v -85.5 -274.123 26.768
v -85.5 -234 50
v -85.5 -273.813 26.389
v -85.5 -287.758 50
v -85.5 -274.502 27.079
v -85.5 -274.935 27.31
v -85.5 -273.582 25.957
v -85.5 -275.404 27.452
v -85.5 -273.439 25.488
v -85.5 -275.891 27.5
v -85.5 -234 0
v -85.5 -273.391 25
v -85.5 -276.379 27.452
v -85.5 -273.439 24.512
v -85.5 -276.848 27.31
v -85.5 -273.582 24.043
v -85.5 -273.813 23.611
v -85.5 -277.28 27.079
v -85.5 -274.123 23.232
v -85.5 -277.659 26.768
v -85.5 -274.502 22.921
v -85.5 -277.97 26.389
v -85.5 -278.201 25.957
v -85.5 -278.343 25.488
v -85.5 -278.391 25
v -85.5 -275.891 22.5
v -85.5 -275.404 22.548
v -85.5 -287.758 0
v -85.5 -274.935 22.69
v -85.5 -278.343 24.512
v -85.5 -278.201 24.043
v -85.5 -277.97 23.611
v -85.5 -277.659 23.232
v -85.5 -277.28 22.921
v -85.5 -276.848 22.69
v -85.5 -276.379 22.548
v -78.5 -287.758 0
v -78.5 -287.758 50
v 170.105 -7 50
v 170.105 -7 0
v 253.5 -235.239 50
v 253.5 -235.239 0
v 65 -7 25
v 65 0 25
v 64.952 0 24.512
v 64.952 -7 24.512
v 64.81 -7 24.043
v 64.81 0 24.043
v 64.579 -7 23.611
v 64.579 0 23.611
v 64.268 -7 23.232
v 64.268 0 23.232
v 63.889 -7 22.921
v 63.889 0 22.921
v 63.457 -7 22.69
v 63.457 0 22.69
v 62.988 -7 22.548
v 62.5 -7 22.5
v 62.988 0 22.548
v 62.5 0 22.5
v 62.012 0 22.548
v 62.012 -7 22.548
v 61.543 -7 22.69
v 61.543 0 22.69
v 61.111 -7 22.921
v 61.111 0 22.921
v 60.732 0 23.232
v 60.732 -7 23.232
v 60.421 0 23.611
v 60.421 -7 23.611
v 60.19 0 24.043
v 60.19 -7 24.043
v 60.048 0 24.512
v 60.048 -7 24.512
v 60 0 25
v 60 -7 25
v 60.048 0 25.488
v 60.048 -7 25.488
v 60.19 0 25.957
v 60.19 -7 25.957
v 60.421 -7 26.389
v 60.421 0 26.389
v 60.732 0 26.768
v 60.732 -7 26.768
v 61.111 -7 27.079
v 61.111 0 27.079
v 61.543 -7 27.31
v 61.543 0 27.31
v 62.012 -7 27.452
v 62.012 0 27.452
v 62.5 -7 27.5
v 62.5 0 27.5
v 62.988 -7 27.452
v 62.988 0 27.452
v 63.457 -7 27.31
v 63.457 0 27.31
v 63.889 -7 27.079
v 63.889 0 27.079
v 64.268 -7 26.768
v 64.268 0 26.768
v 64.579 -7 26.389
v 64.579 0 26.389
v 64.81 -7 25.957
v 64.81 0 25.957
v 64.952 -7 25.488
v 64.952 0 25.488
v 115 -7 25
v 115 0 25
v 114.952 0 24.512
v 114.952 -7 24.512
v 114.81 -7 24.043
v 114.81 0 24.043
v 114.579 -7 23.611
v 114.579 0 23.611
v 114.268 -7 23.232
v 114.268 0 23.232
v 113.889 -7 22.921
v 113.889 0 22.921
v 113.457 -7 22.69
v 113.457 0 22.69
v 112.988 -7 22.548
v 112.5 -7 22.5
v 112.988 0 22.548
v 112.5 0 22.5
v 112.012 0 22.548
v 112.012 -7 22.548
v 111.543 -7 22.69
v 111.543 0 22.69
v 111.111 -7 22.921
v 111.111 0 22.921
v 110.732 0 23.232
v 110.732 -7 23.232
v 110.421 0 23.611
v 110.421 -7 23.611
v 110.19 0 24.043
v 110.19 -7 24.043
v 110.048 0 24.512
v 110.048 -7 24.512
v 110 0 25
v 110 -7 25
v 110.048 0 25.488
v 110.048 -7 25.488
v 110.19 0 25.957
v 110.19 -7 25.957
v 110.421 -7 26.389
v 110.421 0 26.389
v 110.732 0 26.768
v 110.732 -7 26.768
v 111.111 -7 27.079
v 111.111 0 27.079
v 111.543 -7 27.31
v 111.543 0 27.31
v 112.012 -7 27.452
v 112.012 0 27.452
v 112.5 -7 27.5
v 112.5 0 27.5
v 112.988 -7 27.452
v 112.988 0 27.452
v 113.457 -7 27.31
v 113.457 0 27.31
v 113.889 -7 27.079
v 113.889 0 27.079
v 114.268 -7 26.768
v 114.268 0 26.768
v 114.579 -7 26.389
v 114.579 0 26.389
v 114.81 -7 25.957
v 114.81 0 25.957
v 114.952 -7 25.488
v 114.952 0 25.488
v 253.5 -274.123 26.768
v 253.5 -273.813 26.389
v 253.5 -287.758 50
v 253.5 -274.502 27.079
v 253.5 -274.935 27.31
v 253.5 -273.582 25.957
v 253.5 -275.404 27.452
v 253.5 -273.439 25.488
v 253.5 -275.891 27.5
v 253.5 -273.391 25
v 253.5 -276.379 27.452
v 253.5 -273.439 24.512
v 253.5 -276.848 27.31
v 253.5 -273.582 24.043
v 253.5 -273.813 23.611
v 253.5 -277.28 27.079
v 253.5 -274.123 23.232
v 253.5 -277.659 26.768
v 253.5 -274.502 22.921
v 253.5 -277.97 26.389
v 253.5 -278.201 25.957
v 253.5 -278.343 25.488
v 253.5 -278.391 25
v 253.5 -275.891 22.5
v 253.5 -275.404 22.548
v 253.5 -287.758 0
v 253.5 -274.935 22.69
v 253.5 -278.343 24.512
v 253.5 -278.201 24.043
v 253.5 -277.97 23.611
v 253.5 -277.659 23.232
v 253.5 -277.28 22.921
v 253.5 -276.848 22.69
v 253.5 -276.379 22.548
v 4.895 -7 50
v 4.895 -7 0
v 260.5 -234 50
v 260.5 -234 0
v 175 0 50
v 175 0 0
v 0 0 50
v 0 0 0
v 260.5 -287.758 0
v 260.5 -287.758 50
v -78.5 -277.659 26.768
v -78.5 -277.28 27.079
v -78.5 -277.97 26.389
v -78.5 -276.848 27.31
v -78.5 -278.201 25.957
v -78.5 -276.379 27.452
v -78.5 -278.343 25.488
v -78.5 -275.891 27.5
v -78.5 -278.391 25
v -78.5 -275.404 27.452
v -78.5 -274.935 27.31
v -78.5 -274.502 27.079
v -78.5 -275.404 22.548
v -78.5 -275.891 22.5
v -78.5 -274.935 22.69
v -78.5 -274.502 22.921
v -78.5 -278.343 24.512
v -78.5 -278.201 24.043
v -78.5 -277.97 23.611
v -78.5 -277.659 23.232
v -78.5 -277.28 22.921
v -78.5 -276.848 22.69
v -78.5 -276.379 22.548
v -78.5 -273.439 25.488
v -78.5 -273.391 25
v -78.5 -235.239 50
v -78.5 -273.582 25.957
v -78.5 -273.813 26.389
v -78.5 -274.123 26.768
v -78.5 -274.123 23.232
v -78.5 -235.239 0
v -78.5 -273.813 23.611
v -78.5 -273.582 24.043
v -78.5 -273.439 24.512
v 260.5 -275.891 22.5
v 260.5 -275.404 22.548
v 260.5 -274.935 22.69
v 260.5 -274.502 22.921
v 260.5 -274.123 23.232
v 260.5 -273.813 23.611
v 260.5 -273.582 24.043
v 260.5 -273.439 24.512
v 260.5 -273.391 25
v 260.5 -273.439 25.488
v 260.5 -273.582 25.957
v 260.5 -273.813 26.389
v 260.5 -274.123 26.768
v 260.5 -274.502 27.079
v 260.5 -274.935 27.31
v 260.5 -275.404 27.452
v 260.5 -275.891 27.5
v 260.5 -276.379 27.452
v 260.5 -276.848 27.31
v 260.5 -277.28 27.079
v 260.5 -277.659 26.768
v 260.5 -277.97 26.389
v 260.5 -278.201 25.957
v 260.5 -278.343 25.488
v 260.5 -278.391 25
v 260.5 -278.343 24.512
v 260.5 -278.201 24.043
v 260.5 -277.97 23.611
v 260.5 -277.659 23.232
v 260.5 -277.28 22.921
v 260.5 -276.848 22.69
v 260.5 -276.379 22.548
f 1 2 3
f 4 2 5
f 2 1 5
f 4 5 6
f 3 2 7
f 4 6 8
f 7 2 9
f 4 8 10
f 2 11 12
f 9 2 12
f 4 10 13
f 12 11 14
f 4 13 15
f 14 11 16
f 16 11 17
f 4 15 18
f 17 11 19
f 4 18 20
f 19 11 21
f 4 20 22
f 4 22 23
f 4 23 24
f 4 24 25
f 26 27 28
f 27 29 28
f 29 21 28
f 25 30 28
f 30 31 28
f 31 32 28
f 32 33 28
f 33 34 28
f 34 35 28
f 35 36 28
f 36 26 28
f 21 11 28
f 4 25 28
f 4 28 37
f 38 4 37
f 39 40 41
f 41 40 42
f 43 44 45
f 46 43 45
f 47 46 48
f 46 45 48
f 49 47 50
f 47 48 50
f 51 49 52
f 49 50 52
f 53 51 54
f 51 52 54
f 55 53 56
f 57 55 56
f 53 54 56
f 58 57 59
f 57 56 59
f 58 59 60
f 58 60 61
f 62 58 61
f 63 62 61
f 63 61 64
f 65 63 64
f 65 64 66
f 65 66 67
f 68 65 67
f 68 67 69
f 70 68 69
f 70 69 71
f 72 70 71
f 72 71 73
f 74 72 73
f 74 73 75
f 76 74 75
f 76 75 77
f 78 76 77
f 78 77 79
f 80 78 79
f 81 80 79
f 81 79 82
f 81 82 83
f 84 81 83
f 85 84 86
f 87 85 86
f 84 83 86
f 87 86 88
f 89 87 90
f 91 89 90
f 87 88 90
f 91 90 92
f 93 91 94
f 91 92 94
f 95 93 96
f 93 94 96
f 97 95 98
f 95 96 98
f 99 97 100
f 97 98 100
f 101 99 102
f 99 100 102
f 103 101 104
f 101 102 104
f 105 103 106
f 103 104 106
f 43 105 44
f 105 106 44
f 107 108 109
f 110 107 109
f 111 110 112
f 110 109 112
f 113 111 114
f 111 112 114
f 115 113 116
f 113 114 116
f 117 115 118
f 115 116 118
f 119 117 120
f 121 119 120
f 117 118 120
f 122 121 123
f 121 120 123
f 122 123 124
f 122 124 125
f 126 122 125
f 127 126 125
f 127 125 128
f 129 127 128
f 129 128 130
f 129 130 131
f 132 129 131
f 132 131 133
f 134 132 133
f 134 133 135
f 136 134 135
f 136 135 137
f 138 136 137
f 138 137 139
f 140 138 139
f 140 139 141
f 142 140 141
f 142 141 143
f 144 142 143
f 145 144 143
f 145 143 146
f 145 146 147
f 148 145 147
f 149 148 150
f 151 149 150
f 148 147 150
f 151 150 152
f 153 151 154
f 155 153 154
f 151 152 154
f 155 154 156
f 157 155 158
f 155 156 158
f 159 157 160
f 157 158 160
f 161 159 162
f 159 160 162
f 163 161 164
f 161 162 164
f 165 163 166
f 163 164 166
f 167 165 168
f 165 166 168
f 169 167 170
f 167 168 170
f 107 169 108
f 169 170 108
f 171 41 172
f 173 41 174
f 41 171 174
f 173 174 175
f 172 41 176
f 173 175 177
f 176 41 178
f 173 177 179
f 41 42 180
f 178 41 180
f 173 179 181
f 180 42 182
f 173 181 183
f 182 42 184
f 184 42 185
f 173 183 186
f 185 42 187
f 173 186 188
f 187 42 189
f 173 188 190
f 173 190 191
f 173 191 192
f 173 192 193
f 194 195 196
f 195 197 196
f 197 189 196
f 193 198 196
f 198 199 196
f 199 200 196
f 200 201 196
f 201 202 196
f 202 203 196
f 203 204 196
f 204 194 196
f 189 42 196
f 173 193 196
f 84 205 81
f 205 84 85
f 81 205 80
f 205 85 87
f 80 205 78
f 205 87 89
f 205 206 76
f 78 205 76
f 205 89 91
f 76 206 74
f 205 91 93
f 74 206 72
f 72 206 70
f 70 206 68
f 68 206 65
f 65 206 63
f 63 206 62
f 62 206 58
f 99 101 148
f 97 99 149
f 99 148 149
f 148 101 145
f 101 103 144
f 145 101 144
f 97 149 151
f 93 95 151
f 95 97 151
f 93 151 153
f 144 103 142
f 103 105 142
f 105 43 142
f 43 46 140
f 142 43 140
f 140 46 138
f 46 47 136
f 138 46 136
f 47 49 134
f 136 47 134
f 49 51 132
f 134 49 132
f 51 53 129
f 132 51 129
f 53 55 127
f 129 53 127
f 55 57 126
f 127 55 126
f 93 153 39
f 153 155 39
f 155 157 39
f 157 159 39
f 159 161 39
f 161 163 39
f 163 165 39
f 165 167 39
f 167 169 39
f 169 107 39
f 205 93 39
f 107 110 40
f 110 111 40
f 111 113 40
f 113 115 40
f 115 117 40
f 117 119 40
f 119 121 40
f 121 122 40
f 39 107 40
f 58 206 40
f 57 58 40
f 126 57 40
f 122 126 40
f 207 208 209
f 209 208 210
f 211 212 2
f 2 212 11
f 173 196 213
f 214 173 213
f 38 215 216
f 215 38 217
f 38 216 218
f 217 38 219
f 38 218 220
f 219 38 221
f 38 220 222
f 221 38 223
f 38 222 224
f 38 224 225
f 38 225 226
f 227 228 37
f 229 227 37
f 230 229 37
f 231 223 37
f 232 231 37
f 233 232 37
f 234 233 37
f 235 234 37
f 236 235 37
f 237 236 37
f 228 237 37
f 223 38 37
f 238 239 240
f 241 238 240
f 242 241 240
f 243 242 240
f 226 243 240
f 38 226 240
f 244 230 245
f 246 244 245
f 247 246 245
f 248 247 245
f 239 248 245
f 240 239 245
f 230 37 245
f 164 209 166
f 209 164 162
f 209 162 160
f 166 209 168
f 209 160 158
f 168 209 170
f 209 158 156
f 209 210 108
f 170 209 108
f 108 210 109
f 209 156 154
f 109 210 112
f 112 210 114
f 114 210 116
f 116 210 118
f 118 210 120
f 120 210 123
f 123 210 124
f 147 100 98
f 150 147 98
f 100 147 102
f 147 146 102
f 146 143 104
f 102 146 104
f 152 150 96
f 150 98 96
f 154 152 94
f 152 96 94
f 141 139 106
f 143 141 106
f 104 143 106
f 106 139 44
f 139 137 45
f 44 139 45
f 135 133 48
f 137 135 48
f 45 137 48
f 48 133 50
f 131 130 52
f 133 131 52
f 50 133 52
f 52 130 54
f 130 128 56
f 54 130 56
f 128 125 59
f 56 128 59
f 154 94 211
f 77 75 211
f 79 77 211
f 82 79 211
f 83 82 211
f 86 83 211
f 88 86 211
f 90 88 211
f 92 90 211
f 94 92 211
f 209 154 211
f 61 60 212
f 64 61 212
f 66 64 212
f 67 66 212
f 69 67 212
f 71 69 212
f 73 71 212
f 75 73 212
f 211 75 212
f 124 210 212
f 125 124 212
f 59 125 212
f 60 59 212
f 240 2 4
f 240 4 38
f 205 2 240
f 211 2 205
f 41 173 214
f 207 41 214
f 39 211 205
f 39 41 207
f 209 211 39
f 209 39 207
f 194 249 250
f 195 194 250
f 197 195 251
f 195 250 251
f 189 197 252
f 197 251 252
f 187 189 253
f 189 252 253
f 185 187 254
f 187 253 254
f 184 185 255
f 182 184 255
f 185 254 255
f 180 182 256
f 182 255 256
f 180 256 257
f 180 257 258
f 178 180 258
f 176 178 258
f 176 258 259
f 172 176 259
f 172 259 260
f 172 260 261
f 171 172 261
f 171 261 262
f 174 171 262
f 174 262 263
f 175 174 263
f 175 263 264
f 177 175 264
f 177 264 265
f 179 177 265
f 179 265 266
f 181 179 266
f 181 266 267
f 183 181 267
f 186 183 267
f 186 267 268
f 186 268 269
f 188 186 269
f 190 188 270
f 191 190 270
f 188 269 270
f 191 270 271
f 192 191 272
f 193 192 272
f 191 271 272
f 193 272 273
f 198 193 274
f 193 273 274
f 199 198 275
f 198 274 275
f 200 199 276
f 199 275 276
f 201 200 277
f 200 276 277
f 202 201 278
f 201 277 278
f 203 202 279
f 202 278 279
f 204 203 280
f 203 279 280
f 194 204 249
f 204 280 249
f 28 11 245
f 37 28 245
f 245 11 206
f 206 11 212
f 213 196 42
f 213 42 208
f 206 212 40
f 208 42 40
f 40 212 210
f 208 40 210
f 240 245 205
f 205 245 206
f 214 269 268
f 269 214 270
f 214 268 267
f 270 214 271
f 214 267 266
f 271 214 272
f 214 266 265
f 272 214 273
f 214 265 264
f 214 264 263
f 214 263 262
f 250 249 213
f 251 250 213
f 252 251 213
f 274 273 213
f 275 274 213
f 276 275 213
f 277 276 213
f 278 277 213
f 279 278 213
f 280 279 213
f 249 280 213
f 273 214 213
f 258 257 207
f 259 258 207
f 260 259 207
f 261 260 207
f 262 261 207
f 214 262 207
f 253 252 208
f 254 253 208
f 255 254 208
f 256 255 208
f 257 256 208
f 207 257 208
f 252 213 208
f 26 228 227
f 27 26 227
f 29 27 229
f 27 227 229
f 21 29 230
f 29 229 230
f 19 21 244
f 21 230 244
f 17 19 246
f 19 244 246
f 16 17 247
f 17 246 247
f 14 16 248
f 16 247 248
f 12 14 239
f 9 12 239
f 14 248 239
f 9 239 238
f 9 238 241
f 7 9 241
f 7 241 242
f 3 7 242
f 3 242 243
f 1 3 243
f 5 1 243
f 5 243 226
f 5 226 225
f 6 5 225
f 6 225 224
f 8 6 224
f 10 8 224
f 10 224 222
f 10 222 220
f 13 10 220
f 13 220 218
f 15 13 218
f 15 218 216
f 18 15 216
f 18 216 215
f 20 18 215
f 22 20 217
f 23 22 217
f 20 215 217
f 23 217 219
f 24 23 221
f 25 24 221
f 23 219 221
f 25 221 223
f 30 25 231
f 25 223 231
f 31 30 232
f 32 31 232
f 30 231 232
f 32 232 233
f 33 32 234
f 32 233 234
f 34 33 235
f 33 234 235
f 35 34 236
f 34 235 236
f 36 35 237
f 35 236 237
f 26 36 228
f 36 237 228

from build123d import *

# Parameters (mm, degrees)
BOSS_EXTRUDE2_DEPTH = 50
SKETCH2_R           = 2.5
CUT_EXTRUDE1_DEPTH  = 347
SKETCH3_R           = 2.5
CUT_EXTRUDE2_DEPTH  = 288.757501625


with BuildPart() as part:
    # Sketch1 → Boss-Extrude2 (new body)
    with BuildSketch(Plane.XY):
        Polygon((0, 0), (-85.5, -234), (-85.5, -287.757501625), (-78.5, -287.757501625), (-78.5, -235.238794474), (4.894944135, -7), (170.105055865, -7), (253.5, -235.238794474), (253.5, -287.757501625), (260.5, -287.757501625), (260.5, -234), (175, 0), align=None)
    extrude(amount=BOSS_EXTRUDE2_DEPTH)

    # Sketch2 → Cut-Extrude1 (cut, through all)
    with BuildSketch(Plane(origin=(260.5, 0, 0), x_dir=(0, 0, -1), z_dir=(1, 0, 0))):
        with Locations((-25, -275.891246781)):
            Circle(SKETCH2_R)
    extrude(amount=-CUT_EXTRUDE1_DEPTH, mode=Mode.SUBTRACT)

    # Sketch3 → Cut-Extrude2 (cut, through all)
    with BuildSketch(Plane(origin=(0, 0, 0), x_dir=(1, 0, 0), z_dir=(0, 1, 0))):
        with Locations((112.5, -25)):
            Circle(SKETCH3_R)
        with Locations((62.5, -25)):
            Circle(SKETCH3_R)
    extrude(amount=-CUT_EXTRUDE2_DEPTH, mode=Mode.SUBTRACT)


solid = part.part
